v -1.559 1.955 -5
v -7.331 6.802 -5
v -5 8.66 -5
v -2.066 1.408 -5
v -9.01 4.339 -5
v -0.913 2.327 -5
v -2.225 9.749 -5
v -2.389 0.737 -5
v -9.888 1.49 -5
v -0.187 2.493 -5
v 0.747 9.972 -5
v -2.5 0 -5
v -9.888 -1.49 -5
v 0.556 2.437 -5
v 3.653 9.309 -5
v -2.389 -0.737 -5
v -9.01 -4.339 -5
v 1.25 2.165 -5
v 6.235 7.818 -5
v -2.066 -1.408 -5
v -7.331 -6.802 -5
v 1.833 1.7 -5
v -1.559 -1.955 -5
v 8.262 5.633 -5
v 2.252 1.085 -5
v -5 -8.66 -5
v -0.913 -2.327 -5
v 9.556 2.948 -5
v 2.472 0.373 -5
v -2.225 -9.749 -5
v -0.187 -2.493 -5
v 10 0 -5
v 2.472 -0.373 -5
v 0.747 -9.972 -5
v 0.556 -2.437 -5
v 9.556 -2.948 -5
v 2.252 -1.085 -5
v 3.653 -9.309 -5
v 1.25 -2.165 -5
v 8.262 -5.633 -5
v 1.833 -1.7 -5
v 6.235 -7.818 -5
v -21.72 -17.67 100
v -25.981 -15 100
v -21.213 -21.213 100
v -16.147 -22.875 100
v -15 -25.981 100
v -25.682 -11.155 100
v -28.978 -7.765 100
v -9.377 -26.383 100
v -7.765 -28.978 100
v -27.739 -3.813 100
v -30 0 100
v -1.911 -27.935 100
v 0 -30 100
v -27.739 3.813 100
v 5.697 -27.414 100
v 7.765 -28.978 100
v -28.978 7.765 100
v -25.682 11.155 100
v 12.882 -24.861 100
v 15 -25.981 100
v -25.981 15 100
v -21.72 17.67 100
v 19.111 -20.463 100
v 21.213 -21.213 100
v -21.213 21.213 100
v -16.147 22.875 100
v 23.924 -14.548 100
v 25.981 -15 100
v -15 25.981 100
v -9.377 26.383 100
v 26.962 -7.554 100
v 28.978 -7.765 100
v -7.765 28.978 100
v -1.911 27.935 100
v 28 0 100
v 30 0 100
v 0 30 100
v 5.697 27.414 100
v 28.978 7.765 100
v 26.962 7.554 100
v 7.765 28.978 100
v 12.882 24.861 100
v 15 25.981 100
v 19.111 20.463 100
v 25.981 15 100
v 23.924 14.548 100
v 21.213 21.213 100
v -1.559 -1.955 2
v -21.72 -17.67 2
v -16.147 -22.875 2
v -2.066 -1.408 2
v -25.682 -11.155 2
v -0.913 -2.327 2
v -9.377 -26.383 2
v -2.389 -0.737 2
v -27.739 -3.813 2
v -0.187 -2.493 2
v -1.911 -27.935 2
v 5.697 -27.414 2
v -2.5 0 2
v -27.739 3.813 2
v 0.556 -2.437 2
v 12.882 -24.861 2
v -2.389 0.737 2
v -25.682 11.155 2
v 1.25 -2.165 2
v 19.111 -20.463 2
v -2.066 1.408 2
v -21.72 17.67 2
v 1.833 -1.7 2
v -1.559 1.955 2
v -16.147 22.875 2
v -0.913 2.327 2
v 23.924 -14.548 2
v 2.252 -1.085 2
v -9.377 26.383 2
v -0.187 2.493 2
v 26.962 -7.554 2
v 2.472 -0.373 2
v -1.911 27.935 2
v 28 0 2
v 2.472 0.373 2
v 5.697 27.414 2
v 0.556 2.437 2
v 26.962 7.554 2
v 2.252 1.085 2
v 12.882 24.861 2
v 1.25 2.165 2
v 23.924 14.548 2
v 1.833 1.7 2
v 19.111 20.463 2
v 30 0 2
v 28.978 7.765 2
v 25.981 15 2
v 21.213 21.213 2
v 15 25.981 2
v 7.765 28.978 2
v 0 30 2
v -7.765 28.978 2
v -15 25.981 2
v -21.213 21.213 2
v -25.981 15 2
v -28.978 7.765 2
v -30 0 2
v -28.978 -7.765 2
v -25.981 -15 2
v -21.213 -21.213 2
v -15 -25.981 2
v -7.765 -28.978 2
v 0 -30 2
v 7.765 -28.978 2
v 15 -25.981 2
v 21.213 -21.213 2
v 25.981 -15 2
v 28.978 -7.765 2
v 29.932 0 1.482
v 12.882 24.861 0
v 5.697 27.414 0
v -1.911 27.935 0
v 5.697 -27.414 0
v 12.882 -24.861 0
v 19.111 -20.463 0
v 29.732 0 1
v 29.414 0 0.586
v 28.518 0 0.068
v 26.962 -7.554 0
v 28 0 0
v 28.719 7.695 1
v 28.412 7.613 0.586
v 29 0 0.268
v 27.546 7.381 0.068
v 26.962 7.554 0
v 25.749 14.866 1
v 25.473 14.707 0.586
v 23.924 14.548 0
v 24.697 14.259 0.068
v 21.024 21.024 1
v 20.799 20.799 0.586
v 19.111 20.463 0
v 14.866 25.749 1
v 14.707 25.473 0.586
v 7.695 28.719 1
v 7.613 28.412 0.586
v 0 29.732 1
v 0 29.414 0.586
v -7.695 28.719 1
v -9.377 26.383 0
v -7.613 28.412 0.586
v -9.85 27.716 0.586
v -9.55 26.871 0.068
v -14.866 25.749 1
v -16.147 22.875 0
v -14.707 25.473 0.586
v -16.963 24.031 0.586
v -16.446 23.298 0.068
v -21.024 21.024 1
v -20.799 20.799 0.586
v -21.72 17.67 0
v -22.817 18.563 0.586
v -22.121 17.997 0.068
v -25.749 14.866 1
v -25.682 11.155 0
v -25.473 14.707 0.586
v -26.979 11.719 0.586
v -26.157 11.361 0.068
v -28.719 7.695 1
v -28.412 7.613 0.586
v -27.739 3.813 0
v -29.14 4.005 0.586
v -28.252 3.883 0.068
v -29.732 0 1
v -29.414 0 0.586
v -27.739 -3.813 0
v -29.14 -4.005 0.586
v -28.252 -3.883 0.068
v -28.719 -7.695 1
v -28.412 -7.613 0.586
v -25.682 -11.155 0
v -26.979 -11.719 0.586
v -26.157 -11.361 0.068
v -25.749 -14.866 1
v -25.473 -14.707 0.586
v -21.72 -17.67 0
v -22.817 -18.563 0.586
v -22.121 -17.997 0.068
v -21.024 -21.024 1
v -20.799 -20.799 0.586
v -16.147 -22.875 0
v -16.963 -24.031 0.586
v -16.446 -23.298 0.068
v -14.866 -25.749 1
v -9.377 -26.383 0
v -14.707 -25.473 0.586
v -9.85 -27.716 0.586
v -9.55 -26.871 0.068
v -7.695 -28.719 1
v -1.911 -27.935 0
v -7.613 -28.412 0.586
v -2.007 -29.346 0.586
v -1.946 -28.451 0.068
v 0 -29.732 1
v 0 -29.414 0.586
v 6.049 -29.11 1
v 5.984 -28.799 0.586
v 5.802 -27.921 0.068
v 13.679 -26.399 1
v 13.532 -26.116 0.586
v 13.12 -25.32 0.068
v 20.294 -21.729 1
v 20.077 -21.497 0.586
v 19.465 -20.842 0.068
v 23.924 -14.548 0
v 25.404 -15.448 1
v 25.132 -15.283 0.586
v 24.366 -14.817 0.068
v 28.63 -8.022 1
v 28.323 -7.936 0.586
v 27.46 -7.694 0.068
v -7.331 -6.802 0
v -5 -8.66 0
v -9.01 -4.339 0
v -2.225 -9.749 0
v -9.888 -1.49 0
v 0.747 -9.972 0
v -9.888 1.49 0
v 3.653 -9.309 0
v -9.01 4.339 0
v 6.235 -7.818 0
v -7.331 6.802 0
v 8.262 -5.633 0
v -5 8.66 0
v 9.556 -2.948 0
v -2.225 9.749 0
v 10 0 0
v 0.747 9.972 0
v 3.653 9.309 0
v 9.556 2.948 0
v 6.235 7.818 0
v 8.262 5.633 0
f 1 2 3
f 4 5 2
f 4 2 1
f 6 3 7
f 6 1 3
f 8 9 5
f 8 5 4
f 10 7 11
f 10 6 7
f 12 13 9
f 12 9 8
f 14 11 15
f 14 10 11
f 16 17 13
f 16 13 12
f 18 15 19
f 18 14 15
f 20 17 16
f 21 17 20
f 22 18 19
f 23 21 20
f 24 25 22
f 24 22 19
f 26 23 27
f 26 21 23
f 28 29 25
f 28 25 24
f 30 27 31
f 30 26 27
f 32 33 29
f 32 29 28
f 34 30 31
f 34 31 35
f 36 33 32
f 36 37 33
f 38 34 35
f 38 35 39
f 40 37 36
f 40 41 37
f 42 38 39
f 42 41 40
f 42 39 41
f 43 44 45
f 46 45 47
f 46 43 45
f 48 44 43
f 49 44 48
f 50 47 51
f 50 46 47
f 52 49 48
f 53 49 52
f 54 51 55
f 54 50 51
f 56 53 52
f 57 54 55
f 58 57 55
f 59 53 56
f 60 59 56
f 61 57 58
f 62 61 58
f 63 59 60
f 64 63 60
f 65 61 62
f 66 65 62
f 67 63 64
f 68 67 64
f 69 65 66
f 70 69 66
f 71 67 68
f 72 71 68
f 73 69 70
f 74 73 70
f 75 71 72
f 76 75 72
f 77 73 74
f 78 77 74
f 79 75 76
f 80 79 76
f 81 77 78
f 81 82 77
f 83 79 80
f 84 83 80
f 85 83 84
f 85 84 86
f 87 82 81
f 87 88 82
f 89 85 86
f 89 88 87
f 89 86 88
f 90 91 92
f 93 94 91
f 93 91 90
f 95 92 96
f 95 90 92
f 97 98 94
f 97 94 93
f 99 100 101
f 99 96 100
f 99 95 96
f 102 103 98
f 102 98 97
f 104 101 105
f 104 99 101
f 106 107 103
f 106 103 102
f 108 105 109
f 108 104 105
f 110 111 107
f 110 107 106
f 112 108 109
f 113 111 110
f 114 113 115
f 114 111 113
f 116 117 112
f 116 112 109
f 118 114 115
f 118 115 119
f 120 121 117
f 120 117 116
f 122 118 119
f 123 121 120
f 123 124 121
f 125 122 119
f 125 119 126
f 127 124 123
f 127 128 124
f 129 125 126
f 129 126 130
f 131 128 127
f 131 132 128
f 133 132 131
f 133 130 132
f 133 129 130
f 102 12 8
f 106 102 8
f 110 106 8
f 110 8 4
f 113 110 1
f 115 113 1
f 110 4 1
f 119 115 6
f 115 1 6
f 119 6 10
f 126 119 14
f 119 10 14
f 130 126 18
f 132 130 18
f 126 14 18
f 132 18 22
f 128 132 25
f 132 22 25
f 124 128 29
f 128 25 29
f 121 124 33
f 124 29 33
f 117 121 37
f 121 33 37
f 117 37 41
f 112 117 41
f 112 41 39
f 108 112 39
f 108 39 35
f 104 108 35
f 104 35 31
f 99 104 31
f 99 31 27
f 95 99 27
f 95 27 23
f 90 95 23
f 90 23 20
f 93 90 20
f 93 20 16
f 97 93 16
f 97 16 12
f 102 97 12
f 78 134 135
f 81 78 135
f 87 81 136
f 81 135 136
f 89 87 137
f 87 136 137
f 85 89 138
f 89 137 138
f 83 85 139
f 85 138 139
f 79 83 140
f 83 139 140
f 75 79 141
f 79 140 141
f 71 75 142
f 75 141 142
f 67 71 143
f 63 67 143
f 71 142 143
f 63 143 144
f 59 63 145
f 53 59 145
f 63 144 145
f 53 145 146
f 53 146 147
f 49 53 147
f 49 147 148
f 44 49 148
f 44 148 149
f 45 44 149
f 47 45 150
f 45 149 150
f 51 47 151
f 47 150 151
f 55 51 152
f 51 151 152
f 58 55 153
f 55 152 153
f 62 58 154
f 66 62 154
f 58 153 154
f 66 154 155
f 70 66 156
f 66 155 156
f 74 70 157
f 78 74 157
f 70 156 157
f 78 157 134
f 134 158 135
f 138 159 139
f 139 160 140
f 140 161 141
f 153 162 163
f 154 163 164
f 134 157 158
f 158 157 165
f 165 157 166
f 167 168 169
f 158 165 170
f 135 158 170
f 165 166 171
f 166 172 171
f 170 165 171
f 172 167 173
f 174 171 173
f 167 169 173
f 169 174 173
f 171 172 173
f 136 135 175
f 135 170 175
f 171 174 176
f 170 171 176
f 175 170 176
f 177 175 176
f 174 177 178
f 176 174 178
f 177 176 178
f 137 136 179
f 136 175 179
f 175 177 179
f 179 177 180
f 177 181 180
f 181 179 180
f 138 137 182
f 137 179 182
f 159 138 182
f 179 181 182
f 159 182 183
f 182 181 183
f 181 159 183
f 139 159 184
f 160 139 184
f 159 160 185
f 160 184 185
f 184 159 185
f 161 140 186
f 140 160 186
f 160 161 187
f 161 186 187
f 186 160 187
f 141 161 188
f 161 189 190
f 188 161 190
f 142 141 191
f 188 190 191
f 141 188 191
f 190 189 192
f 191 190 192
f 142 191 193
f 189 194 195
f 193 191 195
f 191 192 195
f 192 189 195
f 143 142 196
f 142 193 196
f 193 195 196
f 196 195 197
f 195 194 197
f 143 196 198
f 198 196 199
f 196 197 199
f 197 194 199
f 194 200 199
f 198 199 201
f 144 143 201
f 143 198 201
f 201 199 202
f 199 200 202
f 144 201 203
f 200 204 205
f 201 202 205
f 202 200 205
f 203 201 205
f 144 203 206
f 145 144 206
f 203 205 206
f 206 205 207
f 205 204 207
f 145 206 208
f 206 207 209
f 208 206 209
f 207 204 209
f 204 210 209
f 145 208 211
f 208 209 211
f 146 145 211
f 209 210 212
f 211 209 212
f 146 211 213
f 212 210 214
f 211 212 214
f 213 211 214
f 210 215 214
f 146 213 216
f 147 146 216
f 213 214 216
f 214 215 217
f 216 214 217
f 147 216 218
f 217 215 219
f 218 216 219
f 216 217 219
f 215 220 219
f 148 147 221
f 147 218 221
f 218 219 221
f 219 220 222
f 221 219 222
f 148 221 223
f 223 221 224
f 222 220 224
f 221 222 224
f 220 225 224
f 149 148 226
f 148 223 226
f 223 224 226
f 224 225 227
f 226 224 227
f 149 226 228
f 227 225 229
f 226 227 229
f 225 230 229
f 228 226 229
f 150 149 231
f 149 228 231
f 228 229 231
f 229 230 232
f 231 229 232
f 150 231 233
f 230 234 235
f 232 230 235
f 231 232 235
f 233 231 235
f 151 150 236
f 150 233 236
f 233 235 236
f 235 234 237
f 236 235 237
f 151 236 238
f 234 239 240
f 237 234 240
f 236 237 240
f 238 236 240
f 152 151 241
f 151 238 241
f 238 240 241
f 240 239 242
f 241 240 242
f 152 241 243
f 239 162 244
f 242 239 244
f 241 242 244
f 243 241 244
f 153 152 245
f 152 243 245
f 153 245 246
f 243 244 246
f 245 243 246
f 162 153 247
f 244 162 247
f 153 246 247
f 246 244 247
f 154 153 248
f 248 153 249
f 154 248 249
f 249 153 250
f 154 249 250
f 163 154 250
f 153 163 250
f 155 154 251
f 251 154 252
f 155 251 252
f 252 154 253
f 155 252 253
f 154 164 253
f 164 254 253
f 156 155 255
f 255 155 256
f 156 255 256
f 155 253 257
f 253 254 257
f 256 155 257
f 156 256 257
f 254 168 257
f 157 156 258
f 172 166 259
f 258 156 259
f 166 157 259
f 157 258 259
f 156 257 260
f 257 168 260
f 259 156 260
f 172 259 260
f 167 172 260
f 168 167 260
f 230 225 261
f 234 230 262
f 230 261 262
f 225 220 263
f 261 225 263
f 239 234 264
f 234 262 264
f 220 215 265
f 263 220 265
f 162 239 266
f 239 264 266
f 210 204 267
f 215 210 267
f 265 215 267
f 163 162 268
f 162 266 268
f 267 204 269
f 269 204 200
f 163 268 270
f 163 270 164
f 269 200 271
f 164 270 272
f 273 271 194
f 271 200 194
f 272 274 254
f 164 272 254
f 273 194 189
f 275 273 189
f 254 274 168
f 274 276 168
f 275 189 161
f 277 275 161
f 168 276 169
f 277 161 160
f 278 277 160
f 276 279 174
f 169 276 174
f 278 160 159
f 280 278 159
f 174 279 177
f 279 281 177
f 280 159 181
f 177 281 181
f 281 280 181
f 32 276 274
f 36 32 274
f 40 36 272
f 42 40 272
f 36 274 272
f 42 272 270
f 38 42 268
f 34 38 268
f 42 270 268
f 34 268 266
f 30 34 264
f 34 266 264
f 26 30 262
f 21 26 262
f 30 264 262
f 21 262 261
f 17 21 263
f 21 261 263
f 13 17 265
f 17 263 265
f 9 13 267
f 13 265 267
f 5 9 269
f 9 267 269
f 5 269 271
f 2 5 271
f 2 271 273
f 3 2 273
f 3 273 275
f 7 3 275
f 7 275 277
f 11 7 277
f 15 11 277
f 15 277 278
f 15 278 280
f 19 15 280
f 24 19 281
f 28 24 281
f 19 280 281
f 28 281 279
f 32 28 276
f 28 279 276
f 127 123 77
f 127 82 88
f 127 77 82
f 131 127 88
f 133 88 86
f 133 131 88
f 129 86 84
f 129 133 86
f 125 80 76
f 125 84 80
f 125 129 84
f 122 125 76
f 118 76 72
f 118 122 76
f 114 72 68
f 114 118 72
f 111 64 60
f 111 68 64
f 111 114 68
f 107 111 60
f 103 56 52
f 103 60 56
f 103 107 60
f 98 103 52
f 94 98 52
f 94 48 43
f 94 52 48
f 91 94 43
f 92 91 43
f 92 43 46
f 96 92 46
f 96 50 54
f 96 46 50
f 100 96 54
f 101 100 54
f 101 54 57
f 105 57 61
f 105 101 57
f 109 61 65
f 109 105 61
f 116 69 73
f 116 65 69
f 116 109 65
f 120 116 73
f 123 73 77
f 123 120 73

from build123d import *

# Parameters (mm, degrees)
SKETCH1_R           = 30
BOSS_EXTRUDE1_DEPTH = 100
SHELL1_T            = -2
FILLET1_R           = 2
SKETCH2_R           = 10
BOSS_EXTRUDE2_DEPTH = 5
SKETCH3_R           = 2.5
CUT_EXTRUDE1_DEPTH  = 114.247516529


with BuildPart() as part:
    # Sketch1 → Boss-Extrude1 (new body)
    with BuildSketch(Plane.XY):
        Circle(SKETCH1_R)
    extrude(amount=BOSS_EXTRUDE1_DEPTH)

    # Shell1
    shell1_openings = [part.faces().sort_by_distance(p)[0] for p in [
        (0, 0, 100),
    ]]
    offset(amount=SHELL1_T, openings=shell1_openings, kind=Kind.INTERSECTION)

    # Fillet1
    fillet1_edges = [part.edges().sort_by_distance(p)[0] for p in [
        (-30, 0, 0),
    ]]
    fillet(fillet1_edges, radius=FILLET1_R)

    # Sketch2 → Boss-Extrude2 (add)
    with BuildSketch(Plane(origin=(0, 0, 0), x_dir=(-1, 0, 0), z_dir=(0, 0, -1))):
        with Locations(Location((0, 0, 0), (0, 0, 180))):
            Circle(SKETCH2_R)
    extrude(amount=BOSS_EXTRUDE2_DEPTH)

    # Sketch3 → Cut-Extrude1 (cut, through all)
    with BuildSketch(Plane(origin=(0, 0, -5), x_dir=(-1, 0, 0), z_dir=(0, 0, -1))):
        Circle(SKETCH3_R)
    extrude(amount=-CUT_EXTRUDE1_DEPTH, mode=Mode.SUBTRACT)


solid = part.part
